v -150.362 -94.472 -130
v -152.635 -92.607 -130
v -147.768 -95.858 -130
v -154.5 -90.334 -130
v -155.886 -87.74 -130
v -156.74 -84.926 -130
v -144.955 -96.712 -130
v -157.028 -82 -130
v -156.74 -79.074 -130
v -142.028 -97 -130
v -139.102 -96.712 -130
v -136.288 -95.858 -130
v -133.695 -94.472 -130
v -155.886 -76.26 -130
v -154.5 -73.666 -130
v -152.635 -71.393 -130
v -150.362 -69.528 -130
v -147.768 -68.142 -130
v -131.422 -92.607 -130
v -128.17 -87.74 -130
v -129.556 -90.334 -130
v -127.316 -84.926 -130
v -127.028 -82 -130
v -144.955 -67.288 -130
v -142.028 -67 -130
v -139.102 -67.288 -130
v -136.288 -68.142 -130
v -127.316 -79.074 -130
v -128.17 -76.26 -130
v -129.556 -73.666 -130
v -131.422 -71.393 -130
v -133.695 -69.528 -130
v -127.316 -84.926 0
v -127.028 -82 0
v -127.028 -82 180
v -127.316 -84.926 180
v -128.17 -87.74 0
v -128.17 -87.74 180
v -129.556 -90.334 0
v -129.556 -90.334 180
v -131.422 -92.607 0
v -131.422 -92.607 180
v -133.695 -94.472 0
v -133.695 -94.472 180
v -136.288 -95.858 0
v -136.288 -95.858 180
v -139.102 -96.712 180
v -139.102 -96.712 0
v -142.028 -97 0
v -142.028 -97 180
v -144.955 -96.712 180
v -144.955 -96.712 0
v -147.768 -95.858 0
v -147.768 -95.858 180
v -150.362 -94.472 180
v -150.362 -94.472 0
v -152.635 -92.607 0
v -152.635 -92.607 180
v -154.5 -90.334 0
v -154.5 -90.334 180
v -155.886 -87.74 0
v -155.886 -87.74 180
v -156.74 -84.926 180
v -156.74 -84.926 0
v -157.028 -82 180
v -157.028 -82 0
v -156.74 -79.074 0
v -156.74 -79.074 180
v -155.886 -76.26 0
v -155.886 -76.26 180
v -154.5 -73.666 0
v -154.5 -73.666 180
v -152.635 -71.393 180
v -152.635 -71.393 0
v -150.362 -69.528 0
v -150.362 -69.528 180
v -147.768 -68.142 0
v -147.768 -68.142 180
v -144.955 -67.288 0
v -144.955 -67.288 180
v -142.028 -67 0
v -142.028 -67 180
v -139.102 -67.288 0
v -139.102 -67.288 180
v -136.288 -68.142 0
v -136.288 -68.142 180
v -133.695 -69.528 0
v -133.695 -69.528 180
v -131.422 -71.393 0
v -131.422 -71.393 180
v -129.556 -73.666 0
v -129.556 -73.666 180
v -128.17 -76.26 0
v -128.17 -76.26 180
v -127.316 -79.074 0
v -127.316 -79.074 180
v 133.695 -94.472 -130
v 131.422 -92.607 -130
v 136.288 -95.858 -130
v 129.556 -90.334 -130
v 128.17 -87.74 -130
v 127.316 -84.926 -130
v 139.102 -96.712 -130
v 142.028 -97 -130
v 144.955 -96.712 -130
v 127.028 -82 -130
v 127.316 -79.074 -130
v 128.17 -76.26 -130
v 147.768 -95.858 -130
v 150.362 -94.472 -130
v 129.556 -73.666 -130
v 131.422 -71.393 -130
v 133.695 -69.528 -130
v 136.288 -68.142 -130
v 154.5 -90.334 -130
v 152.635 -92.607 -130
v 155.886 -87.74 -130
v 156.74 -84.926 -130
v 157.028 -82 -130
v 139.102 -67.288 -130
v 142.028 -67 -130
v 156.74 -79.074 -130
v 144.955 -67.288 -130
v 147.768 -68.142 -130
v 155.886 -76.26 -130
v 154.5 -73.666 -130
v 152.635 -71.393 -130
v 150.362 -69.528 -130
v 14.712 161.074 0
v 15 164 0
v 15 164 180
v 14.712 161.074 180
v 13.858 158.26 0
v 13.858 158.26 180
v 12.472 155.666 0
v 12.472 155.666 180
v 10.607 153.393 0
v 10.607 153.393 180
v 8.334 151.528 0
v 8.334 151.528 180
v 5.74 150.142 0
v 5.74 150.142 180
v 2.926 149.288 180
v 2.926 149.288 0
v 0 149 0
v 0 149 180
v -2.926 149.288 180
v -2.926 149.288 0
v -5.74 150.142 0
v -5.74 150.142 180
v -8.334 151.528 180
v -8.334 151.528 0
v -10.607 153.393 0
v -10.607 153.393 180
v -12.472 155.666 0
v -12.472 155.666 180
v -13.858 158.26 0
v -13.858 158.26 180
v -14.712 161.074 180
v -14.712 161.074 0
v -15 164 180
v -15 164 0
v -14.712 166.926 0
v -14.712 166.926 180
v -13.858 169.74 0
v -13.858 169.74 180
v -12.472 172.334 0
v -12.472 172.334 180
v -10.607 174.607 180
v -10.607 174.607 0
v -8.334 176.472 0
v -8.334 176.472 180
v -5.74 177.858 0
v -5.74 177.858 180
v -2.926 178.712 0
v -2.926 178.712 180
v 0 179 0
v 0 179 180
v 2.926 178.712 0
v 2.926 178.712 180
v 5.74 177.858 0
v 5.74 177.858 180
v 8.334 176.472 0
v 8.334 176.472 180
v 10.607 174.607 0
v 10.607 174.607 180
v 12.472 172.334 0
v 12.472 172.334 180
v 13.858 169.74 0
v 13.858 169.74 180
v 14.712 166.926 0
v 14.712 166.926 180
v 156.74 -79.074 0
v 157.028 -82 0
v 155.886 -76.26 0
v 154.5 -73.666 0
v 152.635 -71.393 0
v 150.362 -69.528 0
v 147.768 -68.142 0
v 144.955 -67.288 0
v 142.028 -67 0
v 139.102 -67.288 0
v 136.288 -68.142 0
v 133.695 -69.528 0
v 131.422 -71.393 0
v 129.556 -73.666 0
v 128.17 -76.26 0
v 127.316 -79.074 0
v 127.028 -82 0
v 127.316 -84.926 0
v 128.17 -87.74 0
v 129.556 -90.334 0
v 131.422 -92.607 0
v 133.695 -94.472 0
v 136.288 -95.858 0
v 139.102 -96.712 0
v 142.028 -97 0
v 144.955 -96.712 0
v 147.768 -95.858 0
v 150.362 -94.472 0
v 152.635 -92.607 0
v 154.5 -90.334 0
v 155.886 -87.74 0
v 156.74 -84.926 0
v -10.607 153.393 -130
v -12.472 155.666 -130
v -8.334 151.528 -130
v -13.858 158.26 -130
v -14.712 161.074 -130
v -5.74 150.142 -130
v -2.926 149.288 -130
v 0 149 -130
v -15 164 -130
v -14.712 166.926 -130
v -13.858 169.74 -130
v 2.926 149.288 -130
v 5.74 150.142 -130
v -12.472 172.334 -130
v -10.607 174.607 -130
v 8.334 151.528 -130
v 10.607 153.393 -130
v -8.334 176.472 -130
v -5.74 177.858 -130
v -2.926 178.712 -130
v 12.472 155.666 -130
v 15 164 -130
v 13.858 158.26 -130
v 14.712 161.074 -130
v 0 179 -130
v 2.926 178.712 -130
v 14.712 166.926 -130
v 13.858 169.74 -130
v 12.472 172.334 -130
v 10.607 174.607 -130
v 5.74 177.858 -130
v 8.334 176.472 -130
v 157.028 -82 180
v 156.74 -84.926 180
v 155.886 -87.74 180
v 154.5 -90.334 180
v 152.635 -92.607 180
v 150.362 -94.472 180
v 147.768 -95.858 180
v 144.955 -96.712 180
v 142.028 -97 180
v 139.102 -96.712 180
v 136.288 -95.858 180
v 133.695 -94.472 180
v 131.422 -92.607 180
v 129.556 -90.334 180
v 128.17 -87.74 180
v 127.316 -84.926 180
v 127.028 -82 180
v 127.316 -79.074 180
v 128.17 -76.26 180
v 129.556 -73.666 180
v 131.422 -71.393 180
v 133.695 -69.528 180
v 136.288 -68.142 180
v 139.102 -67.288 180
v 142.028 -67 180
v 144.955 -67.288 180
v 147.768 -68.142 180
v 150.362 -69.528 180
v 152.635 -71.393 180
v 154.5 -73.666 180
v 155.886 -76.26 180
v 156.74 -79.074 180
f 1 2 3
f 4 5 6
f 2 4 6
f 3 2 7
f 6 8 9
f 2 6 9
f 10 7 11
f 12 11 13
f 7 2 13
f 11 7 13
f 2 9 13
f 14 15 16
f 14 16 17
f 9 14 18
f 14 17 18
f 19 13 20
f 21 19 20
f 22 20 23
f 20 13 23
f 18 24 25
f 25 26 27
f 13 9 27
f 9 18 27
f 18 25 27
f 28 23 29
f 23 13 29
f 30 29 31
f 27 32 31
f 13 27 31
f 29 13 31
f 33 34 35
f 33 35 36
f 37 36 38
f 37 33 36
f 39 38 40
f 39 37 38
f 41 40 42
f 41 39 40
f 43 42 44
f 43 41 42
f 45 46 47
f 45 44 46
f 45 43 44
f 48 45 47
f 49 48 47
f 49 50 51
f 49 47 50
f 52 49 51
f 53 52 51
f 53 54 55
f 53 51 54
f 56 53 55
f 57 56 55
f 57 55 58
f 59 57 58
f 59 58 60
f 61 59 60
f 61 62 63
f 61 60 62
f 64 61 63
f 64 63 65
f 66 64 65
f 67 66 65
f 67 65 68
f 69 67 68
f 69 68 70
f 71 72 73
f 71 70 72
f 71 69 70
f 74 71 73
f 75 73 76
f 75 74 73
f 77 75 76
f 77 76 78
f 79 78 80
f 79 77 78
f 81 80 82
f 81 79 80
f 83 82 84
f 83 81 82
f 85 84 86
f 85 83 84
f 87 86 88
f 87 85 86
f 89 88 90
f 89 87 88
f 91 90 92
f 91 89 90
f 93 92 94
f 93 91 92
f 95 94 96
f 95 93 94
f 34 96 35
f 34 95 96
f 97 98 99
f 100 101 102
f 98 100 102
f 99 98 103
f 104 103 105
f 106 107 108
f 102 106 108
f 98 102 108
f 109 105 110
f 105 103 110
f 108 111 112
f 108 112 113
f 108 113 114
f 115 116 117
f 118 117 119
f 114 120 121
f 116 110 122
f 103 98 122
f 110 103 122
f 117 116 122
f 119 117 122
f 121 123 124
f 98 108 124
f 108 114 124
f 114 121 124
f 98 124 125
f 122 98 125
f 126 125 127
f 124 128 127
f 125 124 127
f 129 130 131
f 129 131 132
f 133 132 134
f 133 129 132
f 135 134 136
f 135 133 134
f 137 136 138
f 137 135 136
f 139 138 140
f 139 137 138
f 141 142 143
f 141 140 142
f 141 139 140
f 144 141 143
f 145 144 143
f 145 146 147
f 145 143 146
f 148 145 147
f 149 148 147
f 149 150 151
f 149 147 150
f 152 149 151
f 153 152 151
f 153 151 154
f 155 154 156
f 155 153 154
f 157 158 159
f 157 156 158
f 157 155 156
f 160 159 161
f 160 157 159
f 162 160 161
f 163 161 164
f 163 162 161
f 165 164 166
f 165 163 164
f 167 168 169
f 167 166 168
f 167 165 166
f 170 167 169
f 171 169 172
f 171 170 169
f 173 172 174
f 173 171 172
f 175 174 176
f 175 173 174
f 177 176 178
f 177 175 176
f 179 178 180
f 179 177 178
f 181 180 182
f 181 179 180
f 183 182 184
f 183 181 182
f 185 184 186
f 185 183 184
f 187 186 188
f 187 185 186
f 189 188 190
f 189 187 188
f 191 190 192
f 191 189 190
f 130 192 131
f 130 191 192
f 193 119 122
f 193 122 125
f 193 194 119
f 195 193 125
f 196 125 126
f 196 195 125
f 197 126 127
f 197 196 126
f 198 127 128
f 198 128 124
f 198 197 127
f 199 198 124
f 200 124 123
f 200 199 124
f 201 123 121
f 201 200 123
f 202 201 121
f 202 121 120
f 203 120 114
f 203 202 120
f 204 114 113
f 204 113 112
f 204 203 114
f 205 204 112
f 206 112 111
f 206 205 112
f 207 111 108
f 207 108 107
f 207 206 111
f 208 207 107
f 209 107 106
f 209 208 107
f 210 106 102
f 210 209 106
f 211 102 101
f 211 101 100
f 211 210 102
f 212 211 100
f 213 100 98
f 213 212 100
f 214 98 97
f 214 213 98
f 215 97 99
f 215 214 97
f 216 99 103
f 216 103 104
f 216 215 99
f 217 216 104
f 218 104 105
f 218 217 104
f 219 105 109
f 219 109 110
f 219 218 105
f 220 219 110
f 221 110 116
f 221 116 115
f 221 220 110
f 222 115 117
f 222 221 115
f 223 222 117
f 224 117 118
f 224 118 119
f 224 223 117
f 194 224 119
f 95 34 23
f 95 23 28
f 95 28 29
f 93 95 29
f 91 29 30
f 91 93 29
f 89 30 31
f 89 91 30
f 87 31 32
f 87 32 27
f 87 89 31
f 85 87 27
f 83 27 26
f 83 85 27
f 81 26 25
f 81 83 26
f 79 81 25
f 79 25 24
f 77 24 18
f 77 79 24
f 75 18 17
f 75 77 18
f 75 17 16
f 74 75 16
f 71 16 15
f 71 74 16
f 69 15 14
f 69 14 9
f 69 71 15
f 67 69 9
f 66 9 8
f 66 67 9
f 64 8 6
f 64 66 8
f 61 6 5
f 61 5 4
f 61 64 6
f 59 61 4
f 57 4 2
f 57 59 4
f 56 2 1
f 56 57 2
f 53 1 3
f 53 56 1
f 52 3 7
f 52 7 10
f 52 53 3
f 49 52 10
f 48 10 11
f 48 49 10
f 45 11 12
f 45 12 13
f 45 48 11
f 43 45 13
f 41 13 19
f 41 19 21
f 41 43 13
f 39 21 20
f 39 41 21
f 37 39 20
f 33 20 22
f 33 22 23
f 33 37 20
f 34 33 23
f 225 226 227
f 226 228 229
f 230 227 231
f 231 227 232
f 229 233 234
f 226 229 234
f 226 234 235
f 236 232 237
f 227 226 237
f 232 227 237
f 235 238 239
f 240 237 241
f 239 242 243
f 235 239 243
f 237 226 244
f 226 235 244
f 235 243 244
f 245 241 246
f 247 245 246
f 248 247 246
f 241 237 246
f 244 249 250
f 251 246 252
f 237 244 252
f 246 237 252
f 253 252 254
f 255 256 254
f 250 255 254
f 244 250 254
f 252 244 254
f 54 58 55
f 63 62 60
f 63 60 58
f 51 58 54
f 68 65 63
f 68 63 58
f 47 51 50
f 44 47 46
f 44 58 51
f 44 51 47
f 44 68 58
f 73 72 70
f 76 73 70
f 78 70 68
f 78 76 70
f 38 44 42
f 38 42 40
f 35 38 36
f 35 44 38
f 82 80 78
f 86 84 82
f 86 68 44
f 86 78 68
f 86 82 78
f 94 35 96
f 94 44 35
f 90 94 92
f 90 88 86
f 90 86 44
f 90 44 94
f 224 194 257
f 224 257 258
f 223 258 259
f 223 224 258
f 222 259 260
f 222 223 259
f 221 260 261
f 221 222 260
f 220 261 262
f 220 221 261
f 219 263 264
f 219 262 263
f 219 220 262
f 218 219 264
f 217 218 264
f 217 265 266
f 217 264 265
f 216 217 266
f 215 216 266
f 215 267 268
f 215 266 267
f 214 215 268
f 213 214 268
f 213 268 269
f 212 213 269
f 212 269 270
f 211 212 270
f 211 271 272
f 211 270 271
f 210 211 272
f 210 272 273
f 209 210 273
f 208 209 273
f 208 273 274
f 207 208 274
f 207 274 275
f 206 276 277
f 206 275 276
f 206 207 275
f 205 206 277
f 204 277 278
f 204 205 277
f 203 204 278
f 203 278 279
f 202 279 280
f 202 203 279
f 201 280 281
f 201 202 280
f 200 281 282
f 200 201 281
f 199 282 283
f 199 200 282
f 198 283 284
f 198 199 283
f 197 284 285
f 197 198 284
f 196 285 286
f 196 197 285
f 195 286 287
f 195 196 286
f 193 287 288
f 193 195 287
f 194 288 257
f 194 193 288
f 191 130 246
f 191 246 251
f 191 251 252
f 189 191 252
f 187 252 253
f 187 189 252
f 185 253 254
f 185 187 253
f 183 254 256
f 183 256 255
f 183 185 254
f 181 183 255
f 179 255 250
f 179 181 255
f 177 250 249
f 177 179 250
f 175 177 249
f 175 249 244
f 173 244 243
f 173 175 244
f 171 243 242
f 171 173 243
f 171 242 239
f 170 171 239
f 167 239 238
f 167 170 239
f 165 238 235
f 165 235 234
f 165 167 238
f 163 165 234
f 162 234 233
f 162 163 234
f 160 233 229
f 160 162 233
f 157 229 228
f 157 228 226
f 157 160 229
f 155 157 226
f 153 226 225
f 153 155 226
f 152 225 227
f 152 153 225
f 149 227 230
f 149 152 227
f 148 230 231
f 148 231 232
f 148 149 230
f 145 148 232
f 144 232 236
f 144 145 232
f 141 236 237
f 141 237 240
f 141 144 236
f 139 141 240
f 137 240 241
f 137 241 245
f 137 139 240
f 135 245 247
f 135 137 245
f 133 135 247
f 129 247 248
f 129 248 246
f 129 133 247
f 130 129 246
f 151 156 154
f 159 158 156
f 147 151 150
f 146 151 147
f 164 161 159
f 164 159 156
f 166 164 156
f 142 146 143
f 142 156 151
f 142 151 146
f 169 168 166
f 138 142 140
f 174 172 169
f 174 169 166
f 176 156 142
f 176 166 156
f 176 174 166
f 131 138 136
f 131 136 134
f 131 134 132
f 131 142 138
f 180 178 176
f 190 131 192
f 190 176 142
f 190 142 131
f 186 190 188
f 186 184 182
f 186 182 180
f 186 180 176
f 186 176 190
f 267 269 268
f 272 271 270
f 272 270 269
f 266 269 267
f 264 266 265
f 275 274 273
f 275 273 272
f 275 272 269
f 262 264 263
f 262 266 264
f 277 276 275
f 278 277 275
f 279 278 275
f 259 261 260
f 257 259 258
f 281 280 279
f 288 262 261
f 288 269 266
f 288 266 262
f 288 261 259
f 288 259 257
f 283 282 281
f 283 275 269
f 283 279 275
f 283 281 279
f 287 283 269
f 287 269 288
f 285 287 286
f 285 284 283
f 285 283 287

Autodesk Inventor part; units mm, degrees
ref_plane "YZ Plane" through (0, 0, 0) normal (1, 0, 0) x (0, 1, 0)
ref_plane "XZ Plane" through (0, 0, 0) normal (0, 1, 0) x (-1, 0, 0)
ref_plane "XY Plane" through (0, 0, 0) normal (0, 0, 1) x (1, 0, 0)
sketch "Locate Rig Columns" plane through (0, 0, 0) normal (0, 0, 1) x (1, 0, 0)
  circle A0 centre (0, 0) radius 164 construction
  circle A1 centre (0, 164) radius 15
  circle A2 centre (-142.0282, -82) radius 15
  circle A3 centre (142.0282, -82) radius 15
  dimension "d5" = 328
  dimension "d0" = 30
  dimension "d3" = 360
extrude "Extrude Rig Columns" add sketch "Locate Rig Columns" along normal blind 180 and the other way blind 130
equation "\"d5\" = RigColumnsPCD"
equation "\"d0\" = RigColumnsDiameter"
equation "\"RigColumnsPCD\" = 328"
equation "\"RigColumnsDiameter\" = 30"
properties part number "Locate Rig Columns" material "Steel, Mild"
